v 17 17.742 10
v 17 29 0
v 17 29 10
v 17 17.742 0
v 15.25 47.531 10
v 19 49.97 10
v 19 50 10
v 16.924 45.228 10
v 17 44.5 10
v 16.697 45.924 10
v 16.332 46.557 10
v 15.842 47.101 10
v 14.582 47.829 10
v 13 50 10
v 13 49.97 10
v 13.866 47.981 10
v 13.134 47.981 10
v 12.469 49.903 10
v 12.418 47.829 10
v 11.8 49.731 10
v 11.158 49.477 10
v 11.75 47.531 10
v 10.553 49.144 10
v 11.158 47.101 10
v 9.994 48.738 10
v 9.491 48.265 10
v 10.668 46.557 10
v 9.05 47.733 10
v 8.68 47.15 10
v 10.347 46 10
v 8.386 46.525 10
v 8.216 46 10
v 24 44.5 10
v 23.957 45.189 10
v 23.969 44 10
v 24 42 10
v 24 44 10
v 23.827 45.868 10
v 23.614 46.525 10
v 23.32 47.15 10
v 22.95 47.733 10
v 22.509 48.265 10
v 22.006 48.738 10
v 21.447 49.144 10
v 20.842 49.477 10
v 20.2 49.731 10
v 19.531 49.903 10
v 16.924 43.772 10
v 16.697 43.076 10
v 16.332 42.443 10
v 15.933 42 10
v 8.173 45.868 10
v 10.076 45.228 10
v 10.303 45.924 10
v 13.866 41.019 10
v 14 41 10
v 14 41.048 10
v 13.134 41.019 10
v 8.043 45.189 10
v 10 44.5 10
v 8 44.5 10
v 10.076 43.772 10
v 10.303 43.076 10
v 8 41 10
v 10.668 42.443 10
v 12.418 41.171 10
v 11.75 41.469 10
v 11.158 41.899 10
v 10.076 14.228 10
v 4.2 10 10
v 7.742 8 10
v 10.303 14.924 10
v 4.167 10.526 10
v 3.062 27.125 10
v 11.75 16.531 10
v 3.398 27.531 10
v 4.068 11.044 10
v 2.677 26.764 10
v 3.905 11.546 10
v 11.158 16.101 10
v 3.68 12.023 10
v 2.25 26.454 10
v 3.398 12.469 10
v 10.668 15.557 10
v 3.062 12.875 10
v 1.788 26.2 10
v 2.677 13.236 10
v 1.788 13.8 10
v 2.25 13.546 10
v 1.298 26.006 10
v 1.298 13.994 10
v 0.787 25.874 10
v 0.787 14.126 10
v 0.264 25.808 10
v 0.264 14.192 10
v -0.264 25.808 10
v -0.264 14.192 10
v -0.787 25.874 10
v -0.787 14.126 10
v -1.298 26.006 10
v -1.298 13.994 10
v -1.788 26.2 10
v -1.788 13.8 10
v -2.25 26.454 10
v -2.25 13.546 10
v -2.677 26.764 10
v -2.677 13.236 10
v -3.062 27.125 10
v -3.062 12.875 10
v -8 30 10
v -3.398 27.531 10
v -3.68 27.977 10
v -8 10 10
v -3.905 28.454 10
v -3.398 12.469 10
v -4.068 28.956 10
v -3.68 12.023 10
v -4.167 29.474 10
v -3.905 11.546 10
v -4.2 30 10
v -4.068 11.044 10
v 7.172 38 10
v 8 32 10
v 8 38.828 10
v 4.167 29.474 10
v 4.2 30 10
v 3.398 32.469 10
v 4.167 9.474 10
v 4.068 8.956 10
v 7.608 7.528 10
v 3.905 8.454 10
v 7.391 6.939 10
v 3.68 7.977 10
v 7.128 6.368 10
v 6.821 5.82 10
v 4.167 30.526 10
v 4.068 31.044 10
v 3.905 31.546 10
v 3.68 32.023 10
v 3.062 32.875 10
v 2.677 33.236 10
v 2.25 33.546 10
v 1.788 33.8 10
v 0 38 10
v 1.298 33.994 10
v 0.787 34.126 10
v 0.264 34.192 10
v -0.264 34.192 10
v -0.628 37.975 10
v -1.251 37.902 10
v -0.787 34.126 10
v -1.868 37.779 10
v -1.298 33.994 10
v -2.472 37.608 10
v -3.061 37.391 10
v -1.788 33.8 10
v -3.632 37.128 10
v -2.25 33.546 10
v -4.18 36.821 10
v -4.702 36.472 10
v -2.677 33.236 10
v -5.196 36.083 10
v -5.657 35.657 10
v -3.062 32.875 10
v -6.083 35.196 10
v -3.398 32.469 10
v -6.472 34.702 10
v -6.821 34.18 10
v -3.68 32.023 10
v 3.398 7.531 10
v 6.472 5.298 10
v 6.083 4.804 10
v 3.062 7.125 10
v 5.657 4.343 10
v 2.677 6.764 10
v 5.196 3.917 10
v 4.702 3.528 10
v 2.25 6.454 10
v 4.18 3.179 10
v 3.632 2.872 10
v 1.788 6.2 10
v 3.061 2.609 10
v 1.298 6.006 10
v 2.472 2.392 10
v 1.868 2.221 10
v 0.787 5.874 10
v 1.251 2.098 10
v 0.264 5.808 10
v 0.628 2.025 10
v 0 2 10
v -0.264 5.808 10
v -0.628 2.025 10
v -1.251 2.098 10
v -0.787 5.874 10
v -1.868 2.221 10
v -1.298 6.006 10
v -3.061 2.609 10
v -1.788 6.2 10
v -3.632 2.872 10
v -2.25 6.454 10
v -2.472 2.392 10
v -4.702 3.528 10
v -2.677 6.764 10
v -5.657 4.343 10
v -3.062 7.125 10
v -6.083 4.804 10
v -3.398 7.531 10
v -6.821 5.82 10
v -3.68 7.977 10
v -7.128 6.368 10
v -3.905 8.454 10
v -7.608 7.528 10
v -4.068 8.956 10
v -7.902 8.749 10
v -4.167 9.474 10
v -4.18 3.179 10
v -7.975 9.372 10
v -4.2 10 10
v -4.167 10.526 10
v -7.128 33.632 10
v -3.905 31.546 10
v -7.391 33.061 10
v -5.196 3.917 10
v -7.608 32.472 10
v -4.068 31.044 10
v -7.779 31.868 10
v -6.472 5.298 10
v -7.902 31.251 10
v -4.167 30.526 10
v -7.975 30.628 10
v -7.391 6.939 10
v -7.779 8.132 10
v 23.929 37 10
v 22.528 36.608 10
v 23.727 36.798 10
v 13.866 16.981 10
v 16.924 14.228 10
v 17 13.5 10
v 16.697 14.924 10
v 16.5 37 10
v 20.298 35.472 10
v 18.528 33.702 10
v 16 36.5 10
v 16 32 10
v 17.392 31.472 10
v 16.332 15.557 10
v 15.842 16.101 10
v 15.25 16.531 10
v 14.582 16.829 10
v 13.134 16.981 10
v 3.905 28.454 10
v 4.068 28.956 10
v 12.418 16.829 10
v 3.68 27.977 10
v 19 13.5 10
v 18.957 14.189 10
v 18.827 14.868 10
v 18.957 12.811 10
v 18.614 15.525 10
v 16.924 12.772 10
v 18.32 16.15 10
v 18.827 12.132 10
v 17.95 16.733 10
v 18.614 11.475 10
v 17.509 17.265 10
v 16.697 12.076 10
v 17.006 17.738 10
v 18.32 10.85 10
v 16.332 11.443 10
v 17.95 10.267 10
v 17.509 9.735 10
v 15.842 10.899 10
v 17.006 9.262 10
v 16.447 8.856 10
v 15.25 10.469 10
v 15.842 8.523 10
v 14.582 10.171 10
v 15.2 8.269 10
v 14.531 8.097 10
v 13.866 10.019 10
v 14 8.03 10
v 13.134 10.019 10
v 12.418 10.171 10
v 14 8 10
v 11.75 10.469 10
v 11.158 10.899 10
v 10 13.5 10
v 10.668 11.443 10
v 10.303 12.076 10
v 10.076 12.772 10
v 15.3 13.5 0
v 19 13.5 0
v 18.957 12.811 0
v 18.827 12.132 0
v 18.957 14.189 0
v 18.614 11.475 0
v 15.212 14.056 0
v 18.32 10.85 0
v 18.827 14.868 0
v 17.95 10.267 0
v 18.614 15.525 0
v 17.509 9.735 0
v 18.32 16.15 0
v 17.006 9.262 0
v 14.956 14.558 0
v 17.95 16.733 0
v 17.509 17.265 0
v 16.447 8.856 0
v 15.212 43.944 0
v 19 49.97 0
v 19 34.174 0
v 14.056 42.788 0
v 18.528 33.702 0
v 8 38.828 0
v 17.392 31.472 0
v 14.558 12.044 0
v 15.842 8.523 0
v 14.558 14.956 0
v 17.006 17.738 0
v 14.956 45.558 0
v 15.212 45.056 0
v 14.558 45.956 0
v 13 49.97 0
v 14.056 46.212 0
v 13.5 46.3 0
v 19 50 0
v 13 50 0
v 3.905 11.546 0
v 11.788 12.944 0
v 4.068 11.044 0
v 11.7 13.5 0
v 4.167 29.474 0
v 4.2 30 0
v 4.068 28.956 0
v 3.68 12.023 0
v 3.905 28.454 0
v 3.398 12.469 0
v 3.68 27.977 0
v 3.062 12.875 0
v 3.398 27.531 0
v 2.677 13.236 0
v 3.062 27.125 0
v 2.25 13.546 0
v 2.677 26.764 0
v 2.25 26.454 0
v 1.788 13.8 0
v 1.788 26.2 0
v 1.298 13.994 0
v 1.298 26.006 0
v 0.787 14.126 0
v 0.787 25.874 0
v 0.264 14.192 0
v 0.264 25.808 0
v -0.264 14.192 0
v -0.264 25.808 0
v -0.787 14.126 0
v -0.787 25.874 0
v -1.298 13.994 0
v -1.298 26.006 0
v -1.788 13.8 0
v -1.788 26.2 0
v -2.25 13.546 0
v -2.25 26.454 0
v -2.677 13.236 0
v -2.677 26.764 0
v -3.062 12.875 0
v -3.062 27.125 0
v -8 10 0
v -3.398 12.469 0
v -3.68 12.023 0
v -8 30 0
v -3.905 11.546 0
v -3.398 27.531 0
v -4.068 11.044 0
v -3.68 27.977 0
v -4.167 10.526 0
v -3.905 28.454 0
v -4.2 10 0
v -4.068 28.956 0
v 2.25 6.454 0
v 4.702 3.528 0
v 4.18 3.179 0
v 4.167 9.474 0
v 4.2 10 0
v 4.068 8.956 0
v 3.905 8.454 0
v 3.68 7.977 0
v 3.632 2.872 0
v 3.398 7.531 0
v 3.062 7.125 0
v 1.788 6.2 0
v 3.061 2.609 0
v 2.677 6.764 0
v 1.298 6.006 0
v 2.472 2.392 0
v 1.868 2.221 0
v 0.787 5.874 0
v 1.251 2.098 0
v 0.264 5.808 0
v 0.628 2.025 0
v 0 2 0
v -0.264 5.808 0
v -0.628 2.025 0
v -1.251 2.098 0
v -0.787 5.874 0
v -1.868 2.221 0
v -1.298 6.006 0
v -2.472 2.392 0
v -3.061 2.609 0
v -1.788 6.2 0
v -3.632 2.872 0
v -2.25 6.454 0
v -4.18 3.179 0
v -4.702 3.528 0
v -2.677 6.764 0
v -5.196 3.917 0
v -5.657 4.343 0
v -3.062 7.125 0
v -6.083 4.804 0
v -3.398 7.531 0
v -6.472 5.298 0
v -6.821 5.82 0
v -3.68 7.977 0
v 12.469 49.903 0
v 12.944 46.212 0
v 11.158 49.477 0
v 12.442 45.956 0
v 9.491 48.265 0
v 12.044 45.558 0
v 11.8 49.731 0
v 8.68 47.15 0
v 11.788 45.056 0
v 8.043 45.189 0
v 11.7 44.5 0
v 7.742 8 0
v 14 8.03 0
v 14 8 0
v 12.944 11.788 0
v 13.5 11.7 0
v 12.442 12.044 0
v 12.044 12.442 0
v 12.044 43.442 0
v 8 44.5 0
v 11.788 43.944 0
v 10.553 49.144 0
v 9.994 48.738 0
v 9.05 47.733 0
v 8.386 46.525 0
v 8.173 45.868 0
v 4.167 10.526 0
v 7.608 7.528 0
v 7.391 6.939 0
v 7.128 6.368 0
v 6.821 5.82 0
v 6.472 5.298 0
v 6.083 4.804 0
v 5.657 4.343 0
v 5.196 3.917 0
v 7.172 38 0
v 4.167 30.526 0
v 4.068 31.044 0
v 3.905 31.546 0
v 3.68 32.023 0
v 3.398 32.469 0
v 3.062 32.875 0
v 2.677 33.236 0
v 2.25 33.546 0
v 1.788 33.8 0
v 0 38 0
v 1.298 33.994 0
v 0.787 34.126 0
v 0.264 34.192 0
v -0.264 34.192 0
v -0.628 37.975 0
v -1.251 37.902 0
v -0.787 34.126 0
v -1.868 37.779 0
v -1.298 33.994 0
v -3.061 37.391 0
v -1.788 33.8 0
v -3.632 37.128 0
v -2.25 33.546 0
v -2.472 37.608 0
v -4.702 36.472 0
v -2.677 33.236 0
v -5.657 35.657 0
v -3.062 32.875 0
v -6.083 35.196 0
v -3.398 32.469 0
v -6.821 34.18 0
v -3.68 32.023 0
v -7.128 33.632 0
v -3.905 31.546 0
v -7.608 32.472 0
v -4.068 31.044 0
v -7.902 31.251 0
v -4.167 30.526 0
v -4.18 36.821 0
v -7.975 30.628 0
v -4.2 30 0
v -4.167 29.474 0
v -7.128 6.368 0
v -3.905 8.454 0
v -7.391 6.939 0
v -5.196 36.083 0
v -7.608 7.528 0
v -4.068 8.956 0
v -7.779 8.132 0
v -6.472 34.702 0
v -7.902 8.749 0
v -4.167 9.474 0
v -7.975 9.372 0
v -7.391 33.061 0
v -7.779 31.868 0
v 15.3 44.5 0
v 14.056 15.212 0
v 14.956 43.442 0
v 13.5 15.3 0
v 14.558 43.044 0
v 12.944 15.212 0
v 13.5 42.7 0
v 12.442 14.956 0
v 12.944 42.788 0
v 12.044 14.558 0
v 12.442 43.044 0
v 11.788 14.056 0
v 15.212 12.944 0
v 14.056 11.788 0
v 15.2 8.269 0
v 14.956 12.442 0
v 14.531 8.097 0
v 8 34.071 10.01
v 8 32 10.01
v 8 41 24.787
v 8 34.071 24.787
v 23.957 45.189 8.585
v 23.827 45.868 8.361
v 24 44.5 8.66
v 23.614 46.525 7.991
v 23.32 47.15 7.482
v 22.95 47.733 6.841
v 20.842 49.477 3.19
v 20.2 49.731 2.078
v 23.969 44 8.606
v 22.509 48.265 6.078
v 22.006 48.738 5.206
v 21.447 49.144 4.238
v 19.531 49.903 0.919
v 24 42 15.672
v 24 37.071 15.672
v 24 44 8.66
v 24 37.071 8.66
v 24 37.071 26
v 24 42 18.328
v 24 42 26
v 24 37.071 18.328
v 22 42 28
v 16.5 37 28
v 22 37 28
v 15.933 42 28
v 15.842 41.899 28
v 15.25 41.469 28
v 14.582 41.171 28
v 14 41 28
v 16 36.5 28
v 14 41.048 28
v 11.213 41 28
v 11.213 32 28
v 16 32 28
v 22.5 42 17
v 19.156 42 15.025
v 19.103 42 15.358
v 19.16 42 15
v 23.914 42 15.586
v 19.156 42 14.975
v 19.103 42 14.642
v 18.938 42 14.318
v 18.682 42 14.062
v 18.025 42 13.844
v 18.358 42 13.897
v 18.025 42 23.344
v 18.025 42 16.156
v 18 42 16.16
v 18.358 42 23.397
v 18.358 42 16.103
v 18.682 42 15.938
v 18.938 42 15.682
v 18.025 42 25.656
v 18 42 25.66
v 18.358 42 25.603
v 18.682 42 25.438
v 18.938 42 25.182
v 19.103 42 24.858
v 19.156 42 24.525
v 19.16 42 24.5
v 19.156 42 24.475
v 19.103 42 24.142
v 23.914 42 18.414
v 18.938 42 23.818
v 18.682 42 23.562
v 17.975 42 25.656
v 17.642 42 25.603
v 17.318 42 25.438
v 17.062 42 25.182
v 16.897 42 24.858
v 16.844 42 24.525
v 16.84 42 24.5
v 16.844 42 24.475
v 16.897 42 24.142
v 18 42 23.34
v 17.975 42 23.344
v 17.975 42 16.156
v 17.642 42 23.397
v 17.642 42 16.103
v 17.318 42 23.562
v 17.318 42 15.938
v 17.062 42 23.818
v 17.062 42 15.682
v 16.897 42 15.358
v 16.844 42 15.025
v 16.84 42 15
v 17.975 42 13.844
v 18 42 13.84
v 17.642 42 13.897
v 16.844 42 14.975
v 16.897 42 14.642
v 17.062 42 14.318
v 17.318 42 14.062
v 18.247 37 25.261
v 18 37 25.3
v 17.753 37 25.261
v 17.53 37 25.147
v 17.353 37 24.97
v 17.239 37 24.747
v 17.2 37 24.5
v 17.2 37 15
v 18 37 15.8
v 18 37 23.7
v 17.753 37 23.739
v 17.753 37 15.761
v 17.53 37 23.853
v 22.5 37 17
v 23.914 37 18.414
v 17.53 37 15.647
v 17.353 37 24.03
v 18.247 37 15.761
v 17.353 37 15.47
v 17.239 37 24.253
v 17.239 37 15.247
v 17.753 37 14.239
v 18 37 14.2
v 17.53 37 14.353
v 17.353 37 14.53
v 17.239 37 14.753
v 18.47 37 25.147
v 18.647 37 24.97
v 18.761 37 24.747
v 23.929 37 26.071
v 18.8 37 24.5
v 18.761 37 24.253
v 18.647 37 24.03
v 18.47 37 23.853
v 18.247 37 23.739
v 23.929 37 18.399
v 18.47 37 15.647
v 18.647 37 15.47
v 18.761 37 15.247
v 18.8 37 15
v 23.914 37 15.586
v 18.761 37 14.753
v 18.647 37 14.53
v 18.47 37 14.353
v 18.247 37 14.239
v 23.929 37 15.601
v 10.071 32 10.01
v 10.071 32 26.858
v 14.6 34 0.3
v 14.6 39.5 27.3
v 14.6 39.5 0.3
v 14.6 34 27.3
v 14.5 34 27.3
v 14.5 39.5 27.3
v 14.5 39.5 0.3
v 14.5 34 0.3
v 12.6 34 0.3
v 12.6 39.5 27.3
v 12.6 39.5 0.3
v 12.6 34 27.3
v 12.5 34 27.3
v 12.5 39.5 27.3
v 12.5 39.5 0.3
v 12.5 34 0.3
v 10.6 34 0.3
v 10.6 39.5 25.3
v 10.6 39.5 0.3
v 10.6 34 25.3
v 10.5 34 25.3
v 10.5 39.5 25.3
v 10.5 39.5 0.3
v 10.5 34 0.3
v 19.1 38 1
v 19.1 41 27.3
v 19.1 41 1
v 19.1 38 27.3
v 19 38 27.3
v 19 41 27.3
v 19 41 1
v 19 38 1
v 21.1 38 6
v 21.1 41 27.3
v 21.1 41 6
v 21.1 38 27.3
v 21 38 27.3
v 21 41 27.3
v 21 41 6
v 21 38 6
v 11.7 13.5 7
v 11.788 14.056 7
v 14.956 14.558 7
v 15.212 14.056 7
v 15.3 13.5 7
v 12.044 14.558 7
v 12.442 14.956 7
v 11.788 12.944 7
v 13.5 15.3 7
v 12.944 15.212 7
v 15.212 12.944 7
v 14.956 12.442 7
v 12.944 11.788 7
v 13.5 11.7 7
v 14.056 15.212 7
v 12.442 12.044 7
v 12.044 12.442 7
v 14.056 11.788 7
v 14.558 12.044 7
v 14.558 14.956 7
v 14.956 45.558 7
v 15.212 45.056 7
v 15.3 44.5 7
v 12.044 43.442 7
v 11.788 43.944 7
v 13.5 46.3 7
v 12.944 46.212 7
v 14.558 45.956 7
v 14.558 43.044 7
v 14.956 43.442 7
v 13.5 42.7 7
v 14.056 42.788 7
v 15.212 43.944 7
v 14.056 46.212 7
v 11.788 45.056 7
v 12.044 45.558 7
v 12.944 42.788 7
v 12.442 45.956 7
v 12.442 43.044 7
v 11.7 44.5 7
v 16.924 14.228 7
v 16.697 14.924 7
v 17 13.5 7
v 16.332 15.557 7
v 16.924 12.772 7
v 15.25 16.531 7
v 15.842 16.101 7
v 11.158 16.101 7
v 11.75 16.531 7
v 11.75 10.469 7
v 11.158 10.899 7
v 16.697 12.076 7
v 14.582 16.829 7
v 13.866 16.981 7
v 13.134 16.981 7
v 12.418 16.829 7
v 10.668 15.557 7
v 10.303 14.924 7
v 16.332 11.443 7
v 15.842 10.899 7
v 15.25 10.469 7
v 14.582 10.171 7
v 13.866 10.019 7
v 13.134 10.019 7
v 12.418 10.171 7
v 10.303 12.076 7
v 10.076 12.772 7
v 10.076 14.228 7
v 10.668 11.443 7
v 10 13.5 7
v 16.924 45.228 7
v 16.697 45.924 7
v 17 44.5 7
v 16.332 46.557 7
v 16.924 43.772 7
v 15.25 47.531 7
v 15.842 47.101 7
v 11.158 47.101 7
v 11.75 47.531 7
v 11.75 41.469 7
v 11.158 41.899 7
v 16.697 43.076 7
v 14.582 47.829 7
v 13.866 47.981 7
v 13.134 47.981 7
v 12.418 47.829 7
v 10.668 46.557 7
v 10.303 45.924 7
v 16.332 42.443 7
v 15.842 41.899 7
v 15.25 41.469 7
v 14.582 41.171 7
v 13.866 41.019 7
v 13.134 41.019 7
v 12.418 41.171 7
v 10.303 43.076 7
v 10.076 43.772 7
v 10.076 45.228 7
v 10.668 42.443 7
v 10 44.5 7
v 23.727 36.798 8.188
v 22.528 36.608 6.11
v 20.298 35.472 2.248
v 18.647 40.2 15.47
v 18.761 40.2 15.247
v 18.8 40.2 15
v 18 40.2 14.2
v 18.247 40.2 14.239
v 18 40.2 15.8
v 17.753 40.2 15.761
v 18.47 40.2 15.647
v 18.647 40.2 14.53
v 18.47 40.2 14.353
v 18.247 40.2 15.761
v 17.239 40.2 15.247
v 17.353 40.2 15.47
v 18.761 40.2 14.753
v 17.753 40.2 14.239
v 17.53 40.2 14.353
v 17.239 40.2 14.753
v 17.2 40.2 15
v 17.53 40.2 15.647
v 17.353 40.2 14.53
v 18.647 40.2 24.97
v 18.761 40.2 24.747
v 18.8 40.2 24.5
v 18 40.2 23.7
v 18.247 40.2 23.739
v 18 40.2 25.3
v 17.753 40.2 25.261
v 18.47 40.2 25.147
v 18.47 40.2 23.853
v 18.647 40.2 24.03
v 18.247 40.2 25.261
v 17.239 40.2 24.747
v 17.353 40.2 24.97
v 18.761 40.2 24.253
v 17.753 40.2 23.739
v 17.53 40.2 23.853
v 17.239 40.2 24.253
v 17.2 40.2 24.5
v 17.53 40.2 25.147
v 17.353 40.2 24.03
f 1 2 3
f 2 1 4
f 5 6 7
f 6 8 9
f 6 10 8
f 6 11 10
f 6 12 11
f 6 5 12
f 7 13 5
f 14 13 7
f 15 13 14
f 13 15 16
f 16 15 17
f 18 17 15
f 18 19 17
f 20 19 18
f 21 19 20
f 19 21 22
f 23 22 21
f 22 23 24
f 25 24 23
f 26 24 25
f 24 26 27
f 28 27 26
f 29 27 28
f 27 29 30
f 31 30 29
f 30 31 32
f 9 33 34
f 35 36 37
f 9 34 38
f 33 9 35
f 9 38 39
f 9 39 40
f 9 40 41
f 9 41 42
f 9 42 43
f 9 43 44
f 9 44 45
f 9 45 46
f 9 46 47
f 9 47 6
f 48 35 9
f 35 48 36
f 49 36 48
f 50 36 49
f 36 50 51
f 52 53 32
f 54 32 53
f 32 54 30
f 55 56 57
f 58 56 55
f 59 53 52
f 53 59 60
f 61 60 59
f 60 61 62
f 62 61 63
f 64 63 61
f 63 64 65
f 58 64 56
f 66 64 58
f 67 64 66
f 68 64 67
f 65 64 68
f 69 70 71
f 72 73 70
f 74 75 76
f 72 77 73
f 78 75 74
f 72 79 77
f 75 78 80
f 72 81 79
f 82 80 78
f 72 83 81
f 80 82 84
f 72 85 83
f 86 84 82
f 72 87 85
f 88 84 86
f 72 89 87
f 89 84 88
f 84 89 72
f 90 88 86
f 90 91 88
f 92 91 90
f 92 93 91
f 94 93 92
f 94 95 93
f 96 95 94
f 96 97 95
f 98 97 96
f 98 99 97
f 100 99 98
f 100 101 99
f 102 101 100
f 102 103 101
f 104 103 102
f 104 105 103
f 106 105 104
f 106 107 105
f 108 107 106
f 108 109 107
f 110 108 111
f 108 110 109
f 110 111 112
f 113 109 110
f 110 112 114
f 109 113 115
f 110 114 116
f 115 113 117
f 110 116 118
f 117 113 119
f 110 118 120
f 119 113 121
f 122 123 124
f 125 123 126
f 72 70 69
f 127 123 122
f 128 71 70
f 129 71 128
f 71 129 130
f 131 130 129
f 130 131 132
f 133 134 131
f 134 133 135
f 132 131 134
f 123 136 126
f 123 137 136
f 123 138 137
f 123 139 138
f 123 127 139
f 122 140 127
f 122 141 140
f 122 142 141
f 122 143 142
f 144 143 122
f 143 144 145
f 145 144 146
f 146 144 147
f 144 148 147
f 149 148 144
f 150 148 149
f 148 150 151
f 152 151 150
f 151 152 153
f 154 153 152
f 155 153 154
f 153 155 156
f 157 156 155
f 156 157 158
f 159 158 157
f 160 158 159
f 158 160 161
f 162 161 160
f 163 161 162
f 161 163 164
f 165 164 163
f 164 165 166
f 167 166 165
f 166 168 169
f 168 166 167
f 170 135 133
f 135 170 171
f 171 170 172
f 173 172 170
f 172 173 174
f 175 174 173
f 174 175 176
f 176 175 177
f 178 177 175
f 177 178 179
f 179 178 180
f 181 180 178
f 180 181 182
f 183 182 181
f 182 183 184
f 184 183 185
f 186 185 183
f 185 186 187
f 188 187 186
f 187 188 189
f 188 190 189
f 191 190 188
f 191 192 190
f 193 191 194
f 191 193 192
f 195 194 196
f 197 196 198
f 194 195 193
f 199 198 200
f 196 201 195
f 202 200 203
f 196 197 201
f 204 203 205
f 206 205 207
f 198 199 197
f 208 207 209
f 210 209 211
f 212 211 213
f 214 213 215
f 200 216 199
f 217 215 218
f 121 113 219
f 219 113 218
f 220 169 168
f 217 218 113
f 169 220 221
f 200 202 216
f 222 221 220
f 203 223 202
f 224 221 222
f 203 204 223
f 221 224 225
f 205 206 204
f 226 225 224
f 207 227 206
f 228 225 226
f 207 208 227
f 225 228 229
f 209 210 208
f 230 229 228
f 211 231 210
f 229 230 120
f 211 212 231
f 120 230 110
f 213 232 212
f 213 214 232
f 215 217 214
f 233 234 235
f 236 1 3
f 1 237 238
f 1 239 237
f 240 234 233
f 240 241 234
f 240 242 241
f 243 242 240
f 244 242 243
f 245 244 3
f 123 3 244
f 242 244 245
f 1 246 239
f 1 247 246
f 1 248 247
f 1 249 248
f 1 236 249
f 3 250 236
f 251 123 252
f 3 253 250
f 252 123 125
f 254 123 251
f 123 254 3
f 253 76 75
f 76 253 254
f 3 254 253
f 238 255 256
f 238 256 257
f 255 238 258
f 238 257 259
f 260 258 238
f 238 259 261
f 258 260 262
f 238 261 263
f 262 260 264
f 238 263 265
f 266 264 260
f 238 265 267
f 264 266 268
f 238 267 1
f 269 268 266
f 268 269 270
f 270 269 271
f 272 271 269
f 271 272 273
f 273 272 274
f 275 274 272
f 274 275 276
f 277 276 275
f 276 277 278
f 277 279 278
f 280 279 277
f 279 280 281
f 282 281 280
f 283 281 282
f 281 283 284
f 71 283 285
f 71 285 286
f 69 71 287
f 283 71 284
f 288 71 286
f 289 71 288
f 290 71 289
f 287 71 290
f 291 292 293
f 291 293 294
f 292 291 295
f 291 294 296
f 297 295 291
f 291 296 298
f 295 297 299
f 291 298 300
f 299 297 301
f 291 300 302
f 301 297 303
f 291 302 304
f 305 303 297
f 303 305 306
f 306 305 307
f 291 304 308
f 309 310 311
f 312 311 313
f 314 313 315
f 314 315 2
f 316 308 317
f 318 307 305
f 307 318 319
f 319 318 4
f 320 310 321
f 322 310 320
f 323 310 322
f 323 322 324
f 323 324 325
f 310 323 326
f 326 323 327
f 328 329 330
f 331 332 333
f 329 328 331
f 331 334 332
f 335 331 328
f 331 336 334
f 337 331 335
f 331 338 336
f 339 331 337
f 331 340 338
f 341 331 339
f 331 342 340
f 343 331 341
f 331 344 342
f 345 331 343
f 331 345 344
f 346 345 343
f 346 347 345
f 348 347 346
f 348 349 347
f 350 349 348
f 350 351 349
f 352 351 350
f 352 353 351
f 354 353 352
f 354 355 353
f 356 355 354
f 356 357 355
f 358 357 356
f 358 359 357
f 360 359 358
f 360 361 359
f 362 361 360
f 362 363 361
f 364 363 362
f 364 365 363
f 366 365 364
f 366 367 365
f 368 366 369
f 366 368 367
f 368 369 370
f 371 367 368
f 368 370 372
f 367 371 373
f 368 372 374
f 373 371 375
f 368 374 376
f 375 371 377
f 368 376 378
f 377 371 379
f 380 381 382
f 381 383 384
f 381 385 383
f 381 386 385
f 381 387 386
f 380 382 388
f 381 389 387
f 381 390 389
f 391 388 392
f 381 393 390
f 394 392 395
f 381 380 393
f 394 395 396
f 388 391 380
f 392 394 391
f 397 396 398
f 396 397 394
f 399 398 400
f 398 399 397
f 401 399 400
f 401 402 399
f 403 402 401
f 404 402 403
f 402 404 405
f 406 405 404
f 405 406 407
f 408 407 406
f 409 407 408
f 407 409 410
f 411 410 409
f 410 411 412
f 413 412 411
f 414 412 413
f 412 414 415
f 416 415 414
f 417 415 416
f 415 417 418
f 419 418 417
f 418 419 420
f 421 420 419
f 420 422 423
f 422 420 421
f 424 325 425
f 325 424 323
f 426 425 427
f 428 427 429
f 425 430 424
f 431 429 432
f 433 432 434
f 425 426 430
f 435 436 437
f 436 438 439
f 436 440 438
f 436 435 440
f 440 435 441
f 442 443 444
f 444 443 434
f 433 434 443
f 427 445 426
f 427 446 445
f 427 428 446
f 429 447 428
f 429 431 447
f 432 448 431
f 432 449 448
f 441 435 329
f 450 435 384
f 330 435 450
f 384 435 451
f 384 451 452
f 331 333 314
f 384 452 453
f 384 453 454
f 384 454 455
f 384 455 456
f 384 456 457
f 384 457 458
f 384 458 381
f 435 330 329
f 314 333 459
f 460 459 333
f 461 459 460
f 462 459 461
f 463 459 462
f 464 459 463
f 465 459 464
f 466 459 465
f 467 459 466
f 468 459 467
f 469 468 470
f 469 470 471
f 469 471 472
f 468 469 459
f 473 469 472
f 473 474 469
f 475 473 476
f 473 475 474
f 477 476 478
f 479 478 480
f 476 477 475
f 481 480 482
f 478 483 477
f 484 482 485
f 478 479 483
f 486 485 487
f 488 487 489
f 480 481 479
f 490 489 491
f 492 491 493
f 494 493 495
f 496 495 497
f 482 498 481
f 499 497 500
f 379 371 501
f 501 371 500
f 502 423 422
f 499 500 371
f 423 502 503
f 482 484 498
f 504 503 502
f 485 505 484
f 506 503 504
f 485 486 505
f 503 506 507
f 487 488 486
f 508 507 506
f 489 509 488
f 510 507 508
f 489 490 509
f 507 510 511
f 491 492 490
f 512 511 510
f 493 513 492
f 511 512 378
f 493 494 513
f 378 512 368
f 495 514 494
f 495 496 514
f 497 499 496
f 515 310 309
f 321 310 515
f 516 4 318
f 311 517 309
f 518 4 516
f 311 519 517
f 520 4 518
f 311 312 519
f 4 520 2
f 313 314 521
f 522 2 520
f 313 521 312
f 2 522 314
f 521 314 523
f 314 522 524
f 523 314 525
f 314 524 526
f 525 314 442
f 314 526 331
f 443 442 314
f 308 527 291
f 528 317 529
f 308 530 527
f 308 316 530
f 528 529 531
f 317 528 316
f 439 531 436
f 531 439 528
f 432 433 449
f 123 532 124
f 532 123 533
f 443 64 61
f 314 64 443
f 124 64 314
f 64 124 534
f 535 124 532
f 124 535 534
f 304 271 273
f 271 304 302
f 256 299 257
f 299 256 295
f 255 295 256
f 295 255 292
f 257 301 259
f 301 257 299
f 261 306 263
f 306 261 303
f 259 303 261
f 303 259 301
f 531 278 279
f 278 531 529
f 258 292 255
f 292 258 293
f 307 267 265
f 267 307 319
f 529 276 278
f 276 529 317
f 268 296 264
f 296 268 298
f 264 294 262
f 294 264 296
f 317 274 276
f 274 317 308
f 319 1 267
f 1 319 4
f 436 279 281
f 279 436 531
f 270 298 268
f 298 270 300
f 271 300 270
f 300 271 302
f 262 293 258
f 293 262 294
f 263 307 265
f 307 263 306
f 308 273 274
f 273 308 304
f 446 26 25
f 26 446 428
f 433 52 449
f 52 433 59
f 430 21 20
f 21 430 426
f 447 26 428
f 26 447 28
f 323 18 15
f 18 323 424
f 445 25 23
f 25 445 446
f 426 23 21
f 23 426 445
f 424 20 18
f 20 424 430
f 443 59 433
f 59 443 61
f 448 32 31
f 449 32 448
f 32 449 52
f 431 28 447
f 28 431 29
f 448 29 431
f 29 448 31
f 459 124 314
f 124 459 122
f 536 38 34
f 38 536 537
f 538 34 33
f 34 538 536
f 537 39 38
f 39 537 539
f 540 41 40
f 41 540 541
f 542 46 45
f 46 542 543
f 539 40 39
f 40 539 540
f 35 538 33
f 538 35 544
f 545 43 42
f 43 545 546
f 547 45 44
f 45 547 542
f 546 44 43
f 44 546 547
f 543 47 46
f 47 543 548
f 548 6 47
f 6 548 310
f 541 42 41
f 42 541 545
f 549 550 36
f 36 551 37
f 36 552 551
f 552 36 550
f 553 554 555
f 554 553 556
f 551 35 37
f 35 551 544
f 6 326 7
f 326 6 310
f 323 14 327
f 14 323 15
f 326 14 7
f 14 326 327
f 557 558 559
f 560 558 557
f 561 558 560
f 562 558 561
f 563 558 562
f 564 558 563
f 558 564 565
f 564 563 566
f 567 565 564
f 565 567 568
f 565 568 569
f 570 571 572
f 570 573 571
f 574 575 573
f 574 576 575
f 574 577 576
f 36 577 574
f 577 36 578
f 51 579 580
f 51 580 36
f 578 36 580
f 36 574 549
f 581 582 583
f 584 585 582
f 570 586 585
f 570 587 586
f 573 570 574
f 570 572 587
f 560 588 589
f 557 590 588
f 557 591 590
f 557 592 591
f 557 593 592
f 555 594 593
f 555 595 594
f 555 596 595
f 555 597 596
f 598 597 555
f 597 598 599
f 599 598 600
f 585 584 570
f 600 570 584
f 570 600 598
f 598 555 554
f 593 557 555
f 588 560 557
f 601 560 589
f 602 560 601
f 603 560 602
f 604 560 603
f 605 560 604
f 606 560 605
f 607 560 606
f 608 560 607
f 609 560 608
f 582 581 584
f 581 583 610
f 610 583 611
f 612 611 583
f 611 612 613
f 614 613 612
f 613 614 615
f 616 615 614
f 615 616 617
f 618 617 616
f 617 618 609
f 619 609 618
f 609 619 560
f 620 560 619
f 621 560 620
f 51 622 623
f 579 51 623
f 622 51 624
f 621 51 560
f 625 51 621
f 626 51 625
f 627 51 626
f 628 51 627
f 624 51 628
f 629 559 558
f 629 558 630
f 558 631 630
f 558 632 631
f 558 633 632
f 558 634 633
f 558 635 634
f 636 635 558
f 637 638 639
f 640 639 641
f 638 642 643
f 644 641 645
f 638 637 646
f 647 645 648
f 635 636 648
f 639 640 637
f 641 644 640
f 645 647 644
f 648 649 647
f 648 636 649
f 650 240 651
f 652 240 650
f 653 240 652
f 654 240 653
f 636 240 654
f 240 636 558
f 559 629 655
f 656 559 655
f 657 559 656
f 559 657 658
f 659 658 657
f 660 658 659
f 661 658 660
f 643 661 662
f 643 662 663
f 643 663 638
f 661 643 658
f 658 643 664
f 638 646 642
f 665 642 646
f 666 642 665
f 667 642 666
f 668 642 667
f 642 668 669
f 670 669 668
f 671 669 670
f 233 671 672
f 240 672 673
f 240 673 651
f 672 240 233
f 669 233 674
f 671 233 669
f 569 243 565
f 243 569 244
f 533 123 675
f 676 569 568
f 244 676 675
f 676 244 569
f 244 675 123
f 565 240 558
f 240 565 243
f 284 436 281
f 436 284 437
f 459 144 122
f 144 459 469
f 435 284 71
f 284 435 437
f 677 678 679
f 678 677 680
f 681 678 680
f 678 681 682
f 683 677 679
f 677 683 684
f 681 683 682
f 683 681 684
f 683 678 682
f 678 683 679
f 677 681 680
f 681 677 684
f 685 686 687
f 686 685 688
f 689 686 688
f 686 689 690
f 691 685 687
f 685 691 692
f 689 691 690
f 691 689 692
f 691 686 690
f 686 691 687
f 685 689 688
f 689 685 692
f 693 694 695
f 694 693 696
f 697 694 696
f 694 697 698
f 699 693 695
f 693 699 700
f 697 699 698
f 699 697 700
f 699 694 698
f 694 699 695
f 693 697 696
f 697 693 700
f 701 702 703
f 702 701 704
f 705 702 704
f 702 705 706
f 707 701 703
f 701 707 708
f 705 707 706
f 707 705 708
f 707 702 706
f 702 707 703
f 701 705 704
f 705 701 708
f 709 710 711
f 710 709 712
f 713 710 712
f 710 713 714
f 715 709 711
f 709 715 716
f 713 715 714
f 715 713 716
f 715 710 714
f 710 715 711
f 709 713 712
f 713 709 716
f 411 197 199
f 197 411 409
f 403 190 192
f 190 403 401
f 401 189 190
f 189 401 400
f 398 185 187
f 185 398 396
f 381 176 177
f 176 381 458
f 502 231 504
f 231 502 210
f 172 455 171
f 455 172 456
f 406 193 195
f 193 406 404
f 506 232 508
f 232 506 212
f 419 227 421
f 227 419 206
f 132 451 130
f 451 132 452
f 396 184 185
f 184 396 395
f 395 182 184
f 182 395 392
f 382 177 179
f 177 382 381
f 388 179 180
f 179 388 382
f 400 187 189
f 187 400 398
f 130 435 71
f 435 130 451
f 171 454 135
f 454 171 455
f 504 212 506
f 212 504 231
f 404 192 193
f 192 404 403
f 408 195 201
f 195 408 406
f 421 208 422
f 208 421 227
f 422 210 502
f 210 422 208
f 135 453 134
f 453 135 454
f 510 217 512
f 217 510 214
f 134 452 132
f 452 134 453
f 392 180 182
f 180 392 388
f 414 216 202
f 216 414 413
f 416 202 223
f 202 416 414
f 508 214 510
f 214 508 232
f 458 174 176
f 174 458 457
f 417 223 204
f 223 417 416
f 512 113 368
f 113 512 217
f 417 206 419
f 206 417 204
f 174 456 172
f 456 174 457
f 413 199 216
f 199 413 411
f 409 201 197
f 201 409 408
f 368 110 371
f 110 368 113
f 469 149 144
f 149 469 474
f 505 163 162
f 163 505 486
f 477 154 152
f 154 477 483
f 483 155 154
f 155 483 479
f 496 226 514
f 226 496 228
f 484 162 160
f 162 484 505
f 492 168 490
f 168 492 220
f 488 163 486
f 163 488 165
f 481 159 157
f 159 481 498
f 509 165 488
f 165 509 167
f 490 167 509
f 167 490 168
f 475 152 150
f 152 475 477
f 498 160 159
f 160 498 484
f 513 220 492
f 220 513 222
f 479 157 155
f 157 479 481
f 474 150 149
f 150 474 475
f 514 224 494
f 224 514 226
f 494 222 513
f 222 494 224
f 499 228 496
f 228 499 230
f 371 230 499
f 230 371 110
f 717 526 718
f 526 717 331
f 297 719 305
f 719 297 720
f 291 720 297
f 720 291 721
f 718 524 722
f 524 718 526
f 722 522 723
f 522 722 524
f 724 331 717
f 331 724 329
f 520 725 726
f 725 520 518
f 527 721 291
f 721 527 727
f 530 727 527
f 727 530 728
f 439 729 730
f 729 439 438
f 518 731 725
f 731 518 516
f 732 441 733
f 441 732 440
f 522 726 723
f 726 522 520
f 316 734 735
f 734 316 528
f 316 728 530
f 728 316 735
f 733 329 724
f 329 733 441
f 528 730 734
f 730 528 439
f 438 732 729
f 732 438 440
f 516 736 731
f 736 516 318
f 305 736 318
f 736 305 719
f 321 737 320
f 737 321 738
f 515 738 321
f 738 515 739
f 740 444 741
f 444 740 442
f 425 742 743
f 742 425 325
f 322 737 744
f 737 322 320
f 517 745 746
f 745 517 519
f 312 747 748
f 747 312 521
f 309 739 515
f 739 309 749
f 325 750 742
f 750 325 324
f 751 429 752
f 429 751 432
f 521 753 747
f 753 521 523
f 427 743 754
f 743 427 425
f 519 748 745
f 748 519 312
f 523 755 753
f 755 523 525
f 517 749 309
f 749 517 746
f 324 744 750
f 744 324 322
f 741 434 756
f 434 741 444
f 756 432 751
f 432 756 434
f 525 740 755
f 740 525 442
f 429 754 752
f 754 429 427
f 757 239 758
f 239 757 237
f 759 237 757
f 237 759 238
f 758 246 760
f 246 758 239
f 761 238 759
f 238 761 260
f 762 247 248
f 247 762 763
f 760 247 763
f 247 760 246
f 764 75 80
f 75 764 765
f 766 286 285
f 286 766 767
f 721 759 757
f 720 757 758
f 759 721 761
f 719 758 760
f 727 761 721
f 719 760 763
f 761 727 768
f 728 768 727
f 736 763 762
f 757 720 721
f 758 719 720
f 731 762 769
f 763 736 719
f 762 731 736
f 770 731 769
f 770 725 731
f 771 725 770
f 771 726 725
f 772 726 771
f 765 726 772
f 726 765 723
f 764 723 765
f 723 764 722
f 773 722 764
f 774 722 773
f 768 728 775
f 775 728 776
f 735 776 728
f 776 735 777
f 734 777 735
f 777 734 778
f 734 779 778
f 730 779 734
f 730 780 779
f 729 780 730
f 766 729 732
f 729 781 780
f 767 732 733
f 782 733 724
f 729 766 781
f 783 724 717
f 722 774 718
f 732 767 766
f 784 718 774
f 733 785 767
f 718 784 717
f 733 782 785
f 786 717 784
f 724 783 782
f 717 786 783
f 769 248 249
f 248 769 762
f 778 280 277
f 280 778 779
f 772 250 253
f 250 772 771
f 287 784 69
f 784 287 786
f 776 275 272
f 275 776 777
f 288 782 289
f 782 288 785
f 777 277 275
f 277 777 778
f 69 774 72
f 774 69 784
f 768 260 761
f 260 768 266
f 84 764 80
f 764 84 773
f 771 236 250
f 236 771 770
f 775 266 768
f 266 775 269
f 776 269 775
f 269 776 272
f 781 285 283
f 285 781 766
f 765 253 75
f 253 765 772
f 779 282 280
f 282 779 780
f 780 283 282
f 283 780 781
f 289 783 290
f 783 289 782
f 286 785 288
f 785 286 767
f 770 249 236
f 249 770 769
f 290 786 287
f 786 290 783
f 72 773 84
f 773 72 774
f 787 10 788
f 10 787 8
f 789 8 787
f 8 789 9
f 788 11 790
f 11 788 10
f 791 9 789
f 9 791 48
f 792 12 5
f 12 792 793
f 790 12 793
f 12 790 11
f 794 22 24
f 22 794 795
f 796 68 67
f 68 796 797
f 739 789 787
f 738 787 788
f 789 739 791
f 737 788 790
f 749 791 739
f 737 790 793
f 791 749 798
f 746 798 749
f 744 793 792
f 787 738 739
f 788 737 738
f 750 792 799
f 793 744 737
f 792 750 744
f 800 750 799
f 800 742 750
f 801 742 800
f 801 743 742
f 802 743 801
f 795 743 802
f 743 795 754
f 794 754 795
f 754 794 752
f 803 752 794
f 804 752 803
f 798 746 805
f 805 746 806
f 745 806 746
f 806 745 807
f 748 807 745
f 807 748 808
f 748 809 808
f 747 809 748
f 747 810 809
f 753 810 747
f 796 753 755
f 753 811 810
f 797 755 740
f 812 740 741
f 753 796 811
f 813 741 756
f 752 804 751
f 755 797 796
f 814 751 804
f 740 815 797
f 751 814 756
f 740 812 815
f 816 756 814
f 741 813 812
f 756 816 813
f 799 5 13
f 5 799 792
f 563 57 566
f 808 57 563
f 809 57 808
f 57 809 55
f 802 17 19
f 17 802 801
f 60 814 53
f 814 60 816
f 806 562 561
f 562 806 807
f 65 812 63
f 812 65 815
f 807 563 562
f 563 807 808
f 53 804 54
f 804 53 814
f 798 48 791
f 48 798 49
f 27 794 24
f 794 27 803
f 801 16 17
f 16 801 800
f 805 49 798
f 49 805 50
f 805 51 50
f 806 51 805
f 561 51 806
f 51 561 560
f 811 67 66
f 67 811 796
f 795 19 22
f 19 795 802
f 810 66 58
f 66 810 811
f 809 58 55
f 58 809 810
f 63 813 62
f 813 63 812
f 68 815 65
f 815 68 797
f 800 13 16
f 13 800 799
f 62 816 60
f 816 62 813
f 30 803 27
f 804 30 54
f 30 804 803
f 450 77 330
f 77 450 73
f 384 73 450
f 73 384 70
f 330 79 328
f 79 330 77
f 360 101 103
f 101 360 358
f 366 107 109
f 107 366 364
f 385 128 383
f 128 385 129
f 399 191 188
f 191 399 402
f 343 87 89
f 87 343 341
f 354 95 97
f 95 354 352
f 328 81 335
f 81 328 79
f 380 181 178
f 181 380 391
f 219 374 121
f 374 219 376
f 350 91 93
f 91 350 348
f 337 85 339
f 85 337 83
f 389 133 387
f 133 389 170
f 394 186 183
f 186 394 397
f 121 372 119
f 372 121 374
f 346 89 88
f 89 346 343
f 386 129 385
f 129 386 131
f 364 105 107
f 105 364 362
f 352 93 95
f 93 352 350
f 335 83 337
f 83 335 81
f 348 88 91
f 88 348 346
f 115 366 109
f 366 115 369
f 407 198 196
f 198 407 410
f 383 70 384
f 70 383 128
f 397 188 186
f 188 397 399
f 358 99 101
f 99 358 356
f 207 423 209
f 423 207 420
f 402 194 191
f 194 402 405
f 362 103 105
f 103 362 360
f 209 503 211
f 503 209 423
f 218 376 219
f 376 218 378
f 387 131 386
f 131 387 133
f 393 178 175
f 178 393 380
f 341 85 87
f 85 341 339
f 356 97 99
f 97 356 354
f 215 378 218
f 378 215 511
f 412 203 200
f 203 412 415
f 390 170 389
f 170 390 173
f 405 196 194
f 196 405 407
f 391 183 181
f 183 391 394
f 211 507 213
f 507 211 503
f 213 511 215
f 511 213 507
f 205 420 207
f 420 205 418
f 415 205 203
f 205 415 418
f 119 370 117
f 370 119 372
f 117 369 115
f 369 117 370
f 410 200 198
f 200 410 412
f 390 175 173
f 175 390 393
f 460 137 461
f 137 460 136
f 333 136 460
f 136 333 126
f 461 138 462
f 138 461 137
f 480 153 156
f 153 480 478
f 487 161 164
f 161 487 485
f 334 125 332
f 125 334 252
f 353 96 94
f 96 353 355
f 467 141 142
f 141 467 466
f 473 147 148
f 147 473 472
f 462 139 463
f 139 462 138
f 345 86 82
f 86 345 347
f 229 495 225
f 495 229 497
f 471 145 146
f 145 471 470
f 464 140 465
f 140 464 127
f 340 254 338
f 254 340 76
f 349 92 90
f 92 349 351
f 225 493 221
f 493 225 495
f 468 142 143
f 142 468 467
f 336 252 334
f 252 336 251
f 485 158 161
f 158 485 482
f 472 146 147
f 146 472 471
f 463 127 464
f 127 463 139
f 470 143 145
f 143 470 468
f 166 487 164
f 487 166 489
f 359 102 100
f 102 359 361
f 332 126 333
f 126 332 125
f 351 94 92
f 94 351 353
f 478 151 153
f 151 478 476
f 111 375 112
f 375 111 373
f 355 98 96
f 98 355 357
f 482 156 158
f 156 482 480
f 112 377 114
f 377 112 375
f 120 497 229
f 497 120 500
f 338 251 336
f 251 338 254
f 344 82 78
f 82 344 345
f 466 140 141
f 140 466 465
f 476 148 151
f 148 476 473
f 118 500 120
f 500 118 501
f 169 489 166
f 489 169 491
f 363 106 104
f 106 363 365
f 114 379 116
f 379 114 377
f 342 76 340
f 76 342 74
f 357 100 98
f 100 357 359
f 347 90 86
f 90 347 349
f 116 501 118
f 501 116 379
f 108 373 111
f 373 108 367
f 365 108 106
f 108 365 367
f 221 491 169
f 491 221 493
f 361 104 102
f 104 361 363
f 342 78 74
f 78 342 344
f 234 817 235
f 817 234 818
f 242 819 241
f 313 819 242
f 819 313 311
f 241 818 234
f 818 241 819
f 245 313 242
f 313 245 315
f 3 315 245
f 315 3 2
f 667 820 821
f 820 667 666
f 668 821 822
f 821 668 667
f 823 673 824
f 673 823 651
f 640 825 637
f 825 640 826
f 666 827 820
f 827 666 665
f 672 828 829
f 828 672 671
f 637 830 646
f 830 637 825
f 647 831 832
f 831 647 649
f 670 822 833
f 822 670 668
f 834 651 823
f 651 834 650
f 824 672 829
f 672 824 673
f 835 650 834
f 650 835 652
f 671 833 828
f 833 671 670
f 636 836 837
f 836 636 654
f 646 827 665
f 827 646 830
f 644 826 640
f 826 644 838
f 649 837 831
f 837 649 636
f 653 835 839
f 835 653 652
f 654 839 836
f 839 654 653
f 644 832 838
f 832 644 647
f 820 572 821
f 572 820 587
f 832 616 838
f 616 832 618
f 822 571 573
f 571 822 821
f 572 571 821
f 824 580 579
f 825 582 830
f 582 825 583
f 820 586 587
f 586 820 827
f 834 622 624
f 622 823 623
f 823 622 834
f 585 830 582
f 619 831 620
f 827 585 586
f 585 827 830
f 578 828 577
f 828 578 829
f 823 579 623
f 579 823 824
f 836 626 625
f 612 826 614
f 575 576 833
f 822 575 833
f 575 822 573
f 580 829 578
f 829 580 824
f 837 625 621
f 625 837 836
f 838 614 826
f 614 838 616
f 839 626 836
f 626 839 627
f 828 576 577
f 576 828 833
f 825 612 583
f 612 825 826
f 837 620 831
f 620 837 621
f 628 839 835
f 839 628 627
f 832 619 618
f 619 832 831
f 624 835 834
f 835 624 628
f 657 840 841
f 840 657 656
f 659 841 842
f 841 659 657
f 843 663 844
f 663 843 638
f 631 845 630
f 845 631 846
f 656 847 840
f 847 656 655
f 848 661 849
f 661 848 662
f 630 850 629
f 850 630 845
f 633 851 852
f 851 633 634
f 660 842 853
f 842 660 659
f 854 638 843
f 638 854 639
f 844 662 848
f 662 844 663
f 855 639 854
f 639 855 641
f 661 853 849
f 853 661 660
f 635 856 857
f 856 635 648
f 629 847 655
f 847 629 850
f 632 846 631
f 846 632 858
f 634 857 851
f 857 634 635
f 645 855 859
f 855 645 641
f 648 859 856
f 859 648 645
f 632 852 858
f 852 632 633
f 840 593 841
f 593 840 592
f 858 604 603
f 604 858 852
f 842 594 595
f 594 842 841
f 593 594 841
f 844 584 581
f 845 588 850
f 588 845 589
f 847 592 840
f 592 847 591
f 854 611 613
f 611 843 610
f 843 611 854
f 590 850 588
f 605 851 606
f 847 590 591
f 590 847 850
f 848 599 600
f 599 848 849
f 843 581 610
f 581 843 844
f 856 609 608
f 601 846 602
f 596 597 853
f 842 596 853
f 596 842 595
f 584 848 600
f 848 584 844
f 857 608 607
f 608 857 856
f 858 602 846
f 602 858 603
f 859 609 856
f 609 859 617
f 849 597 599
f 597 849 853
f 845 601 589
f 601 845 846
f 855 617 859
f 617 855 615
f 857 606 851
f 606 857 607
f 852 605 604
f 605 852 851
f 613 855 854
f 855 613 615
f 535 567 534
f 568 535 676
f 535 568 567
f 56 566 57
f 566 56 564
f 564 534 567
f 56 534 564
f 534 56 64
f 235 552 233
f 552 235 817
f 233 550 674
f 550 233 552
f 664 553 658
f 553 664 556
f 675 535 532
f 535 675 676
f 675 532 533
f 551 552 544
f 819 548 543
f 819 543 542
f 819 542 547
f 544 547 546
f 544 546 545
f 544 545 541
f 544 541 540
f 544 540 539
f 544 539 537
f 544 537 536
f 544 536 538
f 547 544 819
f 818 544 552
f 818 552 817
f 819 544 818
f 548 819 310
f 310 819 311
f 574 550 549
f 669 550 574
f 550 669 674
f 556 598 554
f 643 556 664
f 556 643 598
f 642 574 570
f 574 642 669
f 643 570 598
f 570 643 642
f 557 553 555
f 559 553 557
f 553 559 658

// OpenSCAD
// file: parameters.scad
// PRUSA iteration3
// Y frame corners
// GNU GPL v3
// Josef Průša <iam@josefprusa.cz> and contributors
// http://www.reprap.org/wiki/Prusa_Mendel
// http://prusamendel.org
// Parameterized by D. Scott Williamson

// MASTER PARAMETERS FILE

// Default to original metric 
metric=true;

// mm in an inch (comversion rate)
inch2mm=25.4;

// Default facets for cylinders
$fn=30;

// Parameters related to printer base 
// affected parts:
//		y-corners.scad
//		y-motor.scad
// 		y-idler.scad
// 		y-distance.scad

	// horizontal rod dimensions
	horizontal_rod_radius = (metric ? 4 : ((5/16)*inch2mm/2));
	horizontal_rod_hole_radius= horizontal_rod_radius + 0.4;
	horizontal_rod_length=270;
	horizontal_rod_bridge_radius=2.6;
	horizontal_rod_washer_radius=(metric ? 10 : ((15/16)*inch2mm/2));
	horizontal_rod_lower_height=horizontal_rod_washer_radius;
	horizontal_rod_upper_height=horizontal_rod_washer_radius*3;
	
	// longitudinal rod dimensions
	longitudinal_rod_radius= (metric ? 5 : ((1/2)*inch2mm/2));
	longitudinal_rod_hole_radius= longitudinal_rod_radius + 0.4;
	longitudinal_rod_length=270;
	longitudinal_rod_height=20;
	
	longitudinal_rod_washer_radius=(metric ? 11 : ((1+3/8)*inch2mm/2));
	longitudinal_rod_washer_hole_radius=longitudinal_rod_washer_radius + 0.4;
	longitudinal_rod_washer_thickness=10;
	
	smooth_rod_radius=4.2;
	smooth_rod_length=10;
	smooth_rod_height=47;
	smooth_rod_end_thickness=2.75;
	
	corner_width=(longitudinal_rod_radius*2)+8;
	corner_height=(horizontal_rod_radius*2)+14;
	corner_depth=49;
	
	lm8uu_keepout_radius=8;
	lm8uu_keepout_length=270;
	lm8uu_keepout_height=smooth_rod_height-1;
	lm8uu_keepout_offset=12.5;
	
	ziptie_width=3.5;
	ziptie_length=30;
	ziptie_height=2;
// main file
// PRUSA iteration3
// Y motor mount
// GNU GPL v3
// Josef Průša <iam@josefprusa.cz> and contributors
// http://www.reprap.org/wiki/Prusa_Mendel
// http://prusamendel.org
// Parameterized by D. Scott Williamson

// DSW: looks like there used to be a configuration file to parameterize this mount
//include <configuration.scad>

// Include master parameters file
include <parameters.scad>;

// Override metric setting here if desired (anywhere after include)
//metric=false;


module y_motor_base(){
    
    union()
    {
    // Motor holding part
    translate(v = [29,-21+50,0]){
        
    difference()
    {    
     union()
    {
    translate(v = [-21+4.5,0,5]) cube(size = [9,31,10], center=true);
    translate(v = [-15.5,-15.5,0]) cylinder(h = 10, r=5.5, $fn=50);
    translate(v = [-15.5,+15.5,0]) cylinder(h = 10, r=5.5, $fn=50);
    translate([-21,7,0]) rotate([0,0,45]) cube([2, 2, 10]);    

    //end stop
    translate(v = [-10.5,+15.5,0]) cylinder(h = 10, r=5.5, $fn=50);
    translate([-12,0,0]) cube([7, 15, 10]);
    translate([-16,16,0]) cube([6, 5, 10]);
    translate([-21+6,8,0]) cube([12-2, 5, 28]);    
    translate([-21,8-5,0]) cube([8, 10, 28]);      
    translate([-21+9.5-2,7,0]) rotate([0,0,45]) cube([2, 2, 28]);    
    // Joins motor holder and rod plate
    translate(v = [-29,-21,0]) cube(size = [14,30,10]);
    }    
        //selective infill
        translate([-14.5,5,0.3]) cube([0.1,5.5,27]);
        translate([-16.5,5,0.3]) cube([0.1,5.5,27]);
        translate([-18.5,5,0.3]) cube([0.1,5.5,25]);
        translate([-10,9,1]) cube([0.1,3,26.3]);
        translate([-8,9,6]) cube([0.1,3,21.3]);
        
    }
}
}
     // Front holding part
     translate(v = [0,10,0]) cylinder(h = 10, r=8, $fn=80);
     translate(v = [0,20,5])cube(size = [16,20,10], center=true);	
     translate(v = [0,30,0])cylinder(h = 10, r=8, $fn=80);
}

module y_motor_holes(){
    translate(v = [29,-21+50,0]){
    // Screw head holes
    translate(v = [-15.5,-15.5,-1]) cylinder(h = 10, r=1.8, $fn=20);
    translate(v = [-15.5,+15.5,-1]) cylinder(h = 10, r=1.8, $fn=20);
    // Screw holes
    translate(v = [-15.5,-15.5,7]) cylinder(h = 7, r=3.5, $fn=30);
    translate(v = [-15.5,+15.5,7]) cylinder(h = 25, r=3.5, $fn=30);
 }
    translate(v = [0,10,-1]) cylinder(h = 12, r=4.2, $fn=50);	
    translate(v = [0,30,-1]) cylinder(h = 12, r=4.2, $fn=50);
 
    //endstop
    translate([25,29,0])  cylinder(h = 29, r=8, $fn=20); 
   
    translate([18,45,15]) rotate([90,0,0]) cylinder(h = 10, r=0.8, $fn=20);
    translate([18,42.2,15]) rotate([90,0,0]) cylinder(h = 2, r1=1.2, r2=0.8, $fn=20);
 
    translate([18,45,24.5]) rotate([90,0,0]) cylinder(h = 10, r=0.8, $fn=20);
    translate([18,42.2,24.5]) rotate([90,0,0]) cylinder(h = 2, r1=1.2, r2=0.8, $fn=20);
   
    // endstop corner cutout
    translate([-10,30,28]) rotate([0,45,0]) cube([15, 19, 15]);	
    translate([-1,41,10])  cube([15, 5, 19]);	
    translate([27,33,0]) rotate([0,0,45]) cube([5, 5, 28]);	
    translate([7,28,10.01]) rotate([0,0,45]) cube([5, 5, 28]); 
    
    translate([19,32,0]) rotate([0,30,0]) cube([8, 20, 18]);	
    translate([24.5-2,32,17]) rotate([0,45,0]) cube([2, 20, 2]);	
    
    translate([23-2,32,29]) rotate([0,45,0]) cube([5, 20, 5]);	
}





// Final part
module y_motor(){
    difference()
    {
        y_motor_base();
        y_motor_holes();
    }
}


y_motor();
